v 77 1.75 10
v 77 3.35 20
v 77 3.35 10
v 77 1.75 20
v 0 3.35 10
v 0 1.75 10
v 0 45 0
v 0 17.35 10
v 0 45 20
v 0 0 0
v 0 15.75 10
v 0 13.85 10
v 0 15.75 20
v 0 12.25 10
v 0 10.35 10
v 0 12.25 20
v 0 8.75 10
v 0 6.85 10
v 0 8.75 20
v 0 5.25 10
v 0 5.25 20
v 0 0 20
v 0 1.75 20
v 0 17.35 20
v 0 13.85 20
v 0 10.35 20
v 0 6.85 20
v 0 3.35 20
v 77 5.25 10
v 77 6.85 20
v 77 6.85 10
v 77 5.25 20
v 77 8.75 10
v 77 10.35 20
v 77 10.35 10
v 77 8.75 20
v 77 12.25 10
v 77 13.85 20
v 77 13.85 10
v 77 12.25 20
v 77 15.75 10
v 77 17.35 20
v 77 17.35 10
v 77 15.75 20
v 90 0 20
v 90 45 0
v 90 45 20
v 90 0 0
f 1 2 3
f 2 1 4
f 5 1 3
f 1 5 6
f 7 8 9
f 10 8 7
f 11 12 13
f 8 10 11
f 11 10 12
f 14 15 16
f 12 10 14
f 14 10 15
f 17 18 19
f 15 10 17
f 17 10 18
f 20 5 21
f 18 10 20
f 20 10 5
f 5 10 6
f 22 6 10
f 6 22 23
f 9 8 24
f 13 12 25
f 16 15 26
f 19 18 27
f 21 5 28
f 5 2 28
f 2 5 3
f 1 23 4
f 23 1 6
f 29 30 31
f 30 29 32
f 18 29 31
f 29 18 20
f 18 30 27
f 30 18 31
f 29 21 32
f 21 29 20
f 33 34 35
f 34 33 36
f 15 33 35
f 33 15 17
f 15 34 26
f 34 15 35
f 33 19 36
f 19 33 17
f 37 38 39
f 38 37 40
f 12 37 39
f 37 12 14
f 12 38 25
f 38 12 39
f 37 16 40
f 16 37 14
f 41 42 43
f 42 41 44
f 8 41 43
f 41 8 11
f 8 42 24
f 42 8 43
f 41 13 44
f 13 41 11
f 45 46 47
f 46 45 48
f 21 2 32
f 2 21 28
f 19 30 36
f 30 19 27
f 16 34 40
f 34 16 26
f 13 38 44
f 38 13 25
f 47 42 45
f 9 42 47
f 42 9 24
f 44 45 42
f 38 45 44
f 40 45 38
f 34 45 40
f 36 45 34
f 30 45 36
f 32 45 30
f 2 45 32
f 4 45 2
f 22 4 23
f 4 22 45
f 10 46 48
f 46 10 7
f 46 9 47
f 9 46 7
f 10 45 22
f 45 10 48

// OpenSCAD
// Microscope slide dimensions (mm)
slide_l = 75;   // Length
slide_w = 25;   // Width
slide_t = 1;    // Thickness

// Base block dimensions (mm)
block_l = 90;   // Length (X)
block_w = 45;   // Width (Y)
block_h = 20;   // Height (Z)

// Slot dimensions and layout (mm)
slot_l = 77;    // Length (X)
slot_w = 1.6;   // Width (Y)
slot_d = 10;    // Depth (Z)
slot_spacing = 3.5; // Centre-to-centre spacing in Y
num_slots = 10; // Number of slots

$fn = 64;

difference() {
    // Solid base block, resting on XY plane at z=0, centred in X and Y
    cube([block_l, block_w, block_h], center=[true, true, false]);

    // Cut 10 parallel slots into the top face
    for (i = [0 : num_slots-1]) {
        y_pos = (i - (num_slots-1)/2) * slot_spacing;
        translate([0, y_pos, block_h - slot_d])
            cube([slot_l, slot_w, slot_d + 0.01]);
    }
}
